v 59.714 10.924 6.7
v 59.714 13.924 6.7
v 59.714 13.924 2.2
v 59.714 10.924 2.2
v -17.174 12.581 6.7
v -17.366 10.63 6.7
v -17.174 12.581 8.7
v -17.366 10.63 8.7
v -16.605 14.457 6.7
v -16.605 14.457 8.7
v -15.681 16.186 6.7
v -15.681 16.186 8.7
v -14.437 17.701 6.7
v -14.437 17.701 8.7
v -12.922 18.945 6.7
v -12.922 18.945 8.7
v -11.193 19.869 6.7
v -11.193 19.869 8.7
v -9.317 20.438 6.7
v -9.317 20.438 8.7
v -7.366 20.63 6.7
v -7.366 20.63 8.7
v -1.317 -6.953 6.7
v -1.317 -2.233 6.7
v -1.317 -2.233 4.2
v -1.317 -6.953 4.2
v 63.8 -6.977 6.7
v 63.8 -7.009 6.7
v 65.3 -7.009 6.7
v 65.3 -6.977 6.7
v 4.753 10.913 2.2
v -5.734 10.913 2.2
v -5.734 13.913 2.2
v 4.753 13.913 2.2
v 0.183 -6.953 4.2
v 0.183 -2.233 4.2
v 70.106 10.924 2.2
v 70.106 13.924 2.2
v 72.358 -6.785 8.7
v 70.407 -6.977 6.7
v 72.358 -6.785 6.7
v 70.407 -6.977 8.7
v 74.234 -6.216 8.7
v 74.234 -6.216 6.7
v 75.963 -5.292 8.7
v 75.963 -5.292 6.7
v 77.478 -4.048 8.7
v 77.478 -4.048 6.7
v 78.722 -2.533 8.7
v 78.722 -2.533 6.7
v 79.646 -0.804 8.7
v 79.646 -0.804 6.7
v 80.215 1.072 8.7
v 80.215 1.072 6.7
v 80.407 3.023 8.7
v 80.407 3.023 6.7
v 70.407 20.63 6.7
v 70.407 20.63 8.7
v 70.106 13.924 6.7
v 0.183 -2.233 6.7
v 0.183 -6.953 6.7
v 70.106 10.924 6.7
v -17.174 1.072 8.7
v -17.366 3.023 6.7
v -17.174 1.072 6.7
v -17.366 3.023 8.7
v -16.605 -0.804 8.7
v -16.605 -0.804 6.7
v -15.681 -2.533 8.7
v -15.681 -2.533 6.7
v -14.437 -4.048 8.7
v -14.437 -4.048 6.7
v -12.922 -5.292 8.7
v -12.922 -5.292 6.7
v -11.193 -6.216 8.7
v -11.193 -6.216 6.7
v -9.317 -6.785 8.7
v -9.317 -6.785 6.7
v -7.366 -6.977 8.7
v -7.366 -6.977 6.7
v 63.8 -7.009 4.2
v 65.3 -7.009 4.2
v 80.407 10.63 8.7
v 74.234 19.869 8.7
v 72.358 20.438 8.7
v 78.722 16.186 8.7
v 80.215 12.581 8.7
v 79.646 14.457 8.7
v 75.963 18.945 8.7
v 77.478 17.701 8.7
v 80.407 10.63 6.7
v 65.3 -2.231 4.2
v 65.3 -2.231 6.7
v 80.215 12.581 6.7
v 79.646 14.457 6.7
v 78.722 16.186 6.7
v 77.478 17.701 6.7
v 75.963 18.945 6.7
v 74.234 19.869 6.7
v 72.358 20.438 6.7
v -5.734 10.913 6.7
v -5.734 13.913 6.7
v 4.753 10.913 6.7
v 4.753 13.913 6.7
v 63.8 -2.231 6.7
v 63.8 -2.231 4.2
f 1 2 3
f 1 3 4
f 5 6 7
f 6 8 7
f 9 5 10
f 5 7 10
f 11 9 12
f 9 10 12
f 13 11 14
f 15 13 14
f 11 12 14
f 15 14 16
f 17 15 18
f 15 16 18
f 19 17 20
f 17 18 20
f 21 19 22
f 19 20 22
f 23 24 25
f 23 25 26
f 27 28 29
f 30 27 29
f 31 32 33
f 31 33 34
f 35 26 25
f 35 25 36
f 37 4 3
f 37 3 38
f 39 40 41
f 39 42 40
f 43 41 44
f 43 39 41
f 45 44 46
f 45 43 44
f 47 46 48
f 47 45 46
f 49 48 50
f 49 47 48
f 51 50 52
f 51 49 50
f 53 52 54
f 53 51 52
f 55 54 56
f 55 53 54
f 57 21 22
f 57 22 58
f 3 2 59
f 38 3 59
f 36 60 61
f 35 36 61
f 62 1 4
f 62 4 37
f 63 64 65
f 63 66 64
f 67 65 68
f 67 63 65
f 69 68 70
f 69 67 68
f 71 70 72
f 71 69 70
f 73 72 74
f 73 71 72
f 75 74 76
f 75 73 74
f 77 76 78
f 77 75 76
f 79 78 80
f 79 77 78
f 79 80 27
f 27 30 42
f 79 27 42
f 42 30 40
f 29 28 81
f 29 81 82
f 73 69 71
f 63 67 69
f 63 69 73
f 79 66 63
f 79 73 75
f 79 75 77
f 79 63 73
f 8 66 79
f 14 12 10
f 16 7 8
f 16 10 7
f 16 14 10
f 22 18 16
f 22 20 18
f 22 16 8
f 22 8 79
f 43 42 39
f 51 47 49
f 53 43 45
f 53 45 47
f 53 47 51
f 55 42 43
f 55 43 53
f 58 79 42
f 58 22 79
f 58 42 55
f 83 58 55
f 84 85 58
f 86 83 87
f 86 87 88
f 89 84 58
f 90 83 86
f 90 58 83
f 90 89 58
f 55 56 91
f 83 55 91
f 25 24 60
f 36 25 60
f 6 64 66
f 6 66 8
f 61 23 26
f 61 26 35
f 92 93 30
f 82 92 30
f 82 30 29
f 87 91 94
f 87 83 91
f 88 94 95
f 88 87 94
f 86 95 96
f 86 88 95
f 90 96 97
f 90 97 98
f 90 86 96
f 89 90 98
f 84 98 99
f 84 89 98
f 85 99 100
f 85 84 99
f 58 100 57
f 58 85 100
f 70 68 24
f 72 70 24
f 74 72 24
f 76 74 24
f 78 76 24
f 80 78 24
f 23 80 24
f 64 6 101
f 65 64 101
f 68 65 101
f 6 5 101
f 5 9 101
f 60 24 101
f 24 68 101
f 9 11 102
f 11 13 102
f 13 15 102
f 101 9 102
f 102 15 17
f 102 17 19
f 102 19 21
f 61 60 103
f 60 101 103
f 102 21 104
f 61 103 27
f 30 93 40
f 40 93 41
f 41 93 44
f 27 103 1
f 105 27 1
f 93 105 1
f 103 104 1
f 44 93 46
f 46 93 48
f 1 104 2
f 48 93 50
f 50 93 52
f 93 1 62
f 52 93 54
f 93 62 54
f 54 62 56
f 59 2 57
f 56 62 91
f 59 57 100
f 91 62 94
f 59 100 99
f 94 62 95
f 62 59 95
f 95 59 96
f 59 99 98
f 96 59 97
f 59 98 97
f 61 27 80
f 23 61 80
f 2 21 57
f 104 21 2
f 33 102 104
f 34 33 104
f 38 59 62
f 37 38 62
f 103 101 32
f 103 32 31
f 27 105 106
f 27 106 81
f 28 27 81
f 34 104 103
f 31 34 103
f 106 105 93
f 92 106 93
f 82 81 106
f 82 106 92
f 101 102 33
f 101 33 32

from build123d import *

# Parameters (mm, degrees)
SKETCH009_W   = 97.773254
SKETCH009_H   = 27.607625
PAD006_DEPTH  = 2
FILLET003_R   = 10
SKETCH010_W   = 1.5
SKETCH010_H   = 4.720073
SKETCH010_H_2 = 4.777608
PAD007_DEPTH  = 2.5
SKETCH011_W   = 10.487562
SKETCH011_H   = 3
SKETCH011_W_2 = 10.392681
PAD008_DEPTH  = 4.5


with BuildPart() as part:
    # Sketch009 → Pad006 (new body)
    with BuildSketch(Plane.XY):
        with Locations((31.520691, 6.826573)):
            Rectangle(SKETCH009_W, SKETCH009_H)
    extrude(amount=PAD006_DEPTH)

    # Fillet003
    fillet003_edges = [part.edges().sort_by_distance(p)[0] for p in [
        (-17.365936, -6.977239, 1),
        (80.407318, -6.977239, 1),
        (80.407318, 20.630386, 1),
        (-17.365936, 20.630386, 1),
    ]]
    fillet(fillet003_edges, radius=FILLET003_R)

    # Sketch010 (on Face2 of Fillet003) → Pad007 (join)
    with BuildSketch(Plane(origin=(0, 0, 0), x_dir=(1, 0, 0), z_dir=(0, 0, -1))):
        with Locations((-0.567265, 4.592866)):
            Rectangle(SKETCH010_W, SKETCH010_H)
        with Locations((64.55027, 4.620095)):
            Rectangle(SKETCH010_W, SKETCH010_H_2)
    extrude(amount=PAD007_DEPTH)

    # Sketch011 (on Face2 of Pad007) → Pad008 (join)
    with BuildSketch(Plane(origin=(0, 0, 0), x_dir=(1, 0, 0), z_dir=(0, 0, -1))):
        with Locations((-0.490359, -12.412728)):
            Rectangle(SKETCH011_W, SKETCH011_H)
        with Locations((64.90986, -12.423971)):
            Rectangle(SKETCH011_W_2, SKETCH011_H)
    extrude(amount=PAD008_DEPTH)


with BuildPart() as part_1:
    # Body004 placement: moved
    add(part.part.moved(Location((0, 0, 6.7))))


solid = part_1.part
